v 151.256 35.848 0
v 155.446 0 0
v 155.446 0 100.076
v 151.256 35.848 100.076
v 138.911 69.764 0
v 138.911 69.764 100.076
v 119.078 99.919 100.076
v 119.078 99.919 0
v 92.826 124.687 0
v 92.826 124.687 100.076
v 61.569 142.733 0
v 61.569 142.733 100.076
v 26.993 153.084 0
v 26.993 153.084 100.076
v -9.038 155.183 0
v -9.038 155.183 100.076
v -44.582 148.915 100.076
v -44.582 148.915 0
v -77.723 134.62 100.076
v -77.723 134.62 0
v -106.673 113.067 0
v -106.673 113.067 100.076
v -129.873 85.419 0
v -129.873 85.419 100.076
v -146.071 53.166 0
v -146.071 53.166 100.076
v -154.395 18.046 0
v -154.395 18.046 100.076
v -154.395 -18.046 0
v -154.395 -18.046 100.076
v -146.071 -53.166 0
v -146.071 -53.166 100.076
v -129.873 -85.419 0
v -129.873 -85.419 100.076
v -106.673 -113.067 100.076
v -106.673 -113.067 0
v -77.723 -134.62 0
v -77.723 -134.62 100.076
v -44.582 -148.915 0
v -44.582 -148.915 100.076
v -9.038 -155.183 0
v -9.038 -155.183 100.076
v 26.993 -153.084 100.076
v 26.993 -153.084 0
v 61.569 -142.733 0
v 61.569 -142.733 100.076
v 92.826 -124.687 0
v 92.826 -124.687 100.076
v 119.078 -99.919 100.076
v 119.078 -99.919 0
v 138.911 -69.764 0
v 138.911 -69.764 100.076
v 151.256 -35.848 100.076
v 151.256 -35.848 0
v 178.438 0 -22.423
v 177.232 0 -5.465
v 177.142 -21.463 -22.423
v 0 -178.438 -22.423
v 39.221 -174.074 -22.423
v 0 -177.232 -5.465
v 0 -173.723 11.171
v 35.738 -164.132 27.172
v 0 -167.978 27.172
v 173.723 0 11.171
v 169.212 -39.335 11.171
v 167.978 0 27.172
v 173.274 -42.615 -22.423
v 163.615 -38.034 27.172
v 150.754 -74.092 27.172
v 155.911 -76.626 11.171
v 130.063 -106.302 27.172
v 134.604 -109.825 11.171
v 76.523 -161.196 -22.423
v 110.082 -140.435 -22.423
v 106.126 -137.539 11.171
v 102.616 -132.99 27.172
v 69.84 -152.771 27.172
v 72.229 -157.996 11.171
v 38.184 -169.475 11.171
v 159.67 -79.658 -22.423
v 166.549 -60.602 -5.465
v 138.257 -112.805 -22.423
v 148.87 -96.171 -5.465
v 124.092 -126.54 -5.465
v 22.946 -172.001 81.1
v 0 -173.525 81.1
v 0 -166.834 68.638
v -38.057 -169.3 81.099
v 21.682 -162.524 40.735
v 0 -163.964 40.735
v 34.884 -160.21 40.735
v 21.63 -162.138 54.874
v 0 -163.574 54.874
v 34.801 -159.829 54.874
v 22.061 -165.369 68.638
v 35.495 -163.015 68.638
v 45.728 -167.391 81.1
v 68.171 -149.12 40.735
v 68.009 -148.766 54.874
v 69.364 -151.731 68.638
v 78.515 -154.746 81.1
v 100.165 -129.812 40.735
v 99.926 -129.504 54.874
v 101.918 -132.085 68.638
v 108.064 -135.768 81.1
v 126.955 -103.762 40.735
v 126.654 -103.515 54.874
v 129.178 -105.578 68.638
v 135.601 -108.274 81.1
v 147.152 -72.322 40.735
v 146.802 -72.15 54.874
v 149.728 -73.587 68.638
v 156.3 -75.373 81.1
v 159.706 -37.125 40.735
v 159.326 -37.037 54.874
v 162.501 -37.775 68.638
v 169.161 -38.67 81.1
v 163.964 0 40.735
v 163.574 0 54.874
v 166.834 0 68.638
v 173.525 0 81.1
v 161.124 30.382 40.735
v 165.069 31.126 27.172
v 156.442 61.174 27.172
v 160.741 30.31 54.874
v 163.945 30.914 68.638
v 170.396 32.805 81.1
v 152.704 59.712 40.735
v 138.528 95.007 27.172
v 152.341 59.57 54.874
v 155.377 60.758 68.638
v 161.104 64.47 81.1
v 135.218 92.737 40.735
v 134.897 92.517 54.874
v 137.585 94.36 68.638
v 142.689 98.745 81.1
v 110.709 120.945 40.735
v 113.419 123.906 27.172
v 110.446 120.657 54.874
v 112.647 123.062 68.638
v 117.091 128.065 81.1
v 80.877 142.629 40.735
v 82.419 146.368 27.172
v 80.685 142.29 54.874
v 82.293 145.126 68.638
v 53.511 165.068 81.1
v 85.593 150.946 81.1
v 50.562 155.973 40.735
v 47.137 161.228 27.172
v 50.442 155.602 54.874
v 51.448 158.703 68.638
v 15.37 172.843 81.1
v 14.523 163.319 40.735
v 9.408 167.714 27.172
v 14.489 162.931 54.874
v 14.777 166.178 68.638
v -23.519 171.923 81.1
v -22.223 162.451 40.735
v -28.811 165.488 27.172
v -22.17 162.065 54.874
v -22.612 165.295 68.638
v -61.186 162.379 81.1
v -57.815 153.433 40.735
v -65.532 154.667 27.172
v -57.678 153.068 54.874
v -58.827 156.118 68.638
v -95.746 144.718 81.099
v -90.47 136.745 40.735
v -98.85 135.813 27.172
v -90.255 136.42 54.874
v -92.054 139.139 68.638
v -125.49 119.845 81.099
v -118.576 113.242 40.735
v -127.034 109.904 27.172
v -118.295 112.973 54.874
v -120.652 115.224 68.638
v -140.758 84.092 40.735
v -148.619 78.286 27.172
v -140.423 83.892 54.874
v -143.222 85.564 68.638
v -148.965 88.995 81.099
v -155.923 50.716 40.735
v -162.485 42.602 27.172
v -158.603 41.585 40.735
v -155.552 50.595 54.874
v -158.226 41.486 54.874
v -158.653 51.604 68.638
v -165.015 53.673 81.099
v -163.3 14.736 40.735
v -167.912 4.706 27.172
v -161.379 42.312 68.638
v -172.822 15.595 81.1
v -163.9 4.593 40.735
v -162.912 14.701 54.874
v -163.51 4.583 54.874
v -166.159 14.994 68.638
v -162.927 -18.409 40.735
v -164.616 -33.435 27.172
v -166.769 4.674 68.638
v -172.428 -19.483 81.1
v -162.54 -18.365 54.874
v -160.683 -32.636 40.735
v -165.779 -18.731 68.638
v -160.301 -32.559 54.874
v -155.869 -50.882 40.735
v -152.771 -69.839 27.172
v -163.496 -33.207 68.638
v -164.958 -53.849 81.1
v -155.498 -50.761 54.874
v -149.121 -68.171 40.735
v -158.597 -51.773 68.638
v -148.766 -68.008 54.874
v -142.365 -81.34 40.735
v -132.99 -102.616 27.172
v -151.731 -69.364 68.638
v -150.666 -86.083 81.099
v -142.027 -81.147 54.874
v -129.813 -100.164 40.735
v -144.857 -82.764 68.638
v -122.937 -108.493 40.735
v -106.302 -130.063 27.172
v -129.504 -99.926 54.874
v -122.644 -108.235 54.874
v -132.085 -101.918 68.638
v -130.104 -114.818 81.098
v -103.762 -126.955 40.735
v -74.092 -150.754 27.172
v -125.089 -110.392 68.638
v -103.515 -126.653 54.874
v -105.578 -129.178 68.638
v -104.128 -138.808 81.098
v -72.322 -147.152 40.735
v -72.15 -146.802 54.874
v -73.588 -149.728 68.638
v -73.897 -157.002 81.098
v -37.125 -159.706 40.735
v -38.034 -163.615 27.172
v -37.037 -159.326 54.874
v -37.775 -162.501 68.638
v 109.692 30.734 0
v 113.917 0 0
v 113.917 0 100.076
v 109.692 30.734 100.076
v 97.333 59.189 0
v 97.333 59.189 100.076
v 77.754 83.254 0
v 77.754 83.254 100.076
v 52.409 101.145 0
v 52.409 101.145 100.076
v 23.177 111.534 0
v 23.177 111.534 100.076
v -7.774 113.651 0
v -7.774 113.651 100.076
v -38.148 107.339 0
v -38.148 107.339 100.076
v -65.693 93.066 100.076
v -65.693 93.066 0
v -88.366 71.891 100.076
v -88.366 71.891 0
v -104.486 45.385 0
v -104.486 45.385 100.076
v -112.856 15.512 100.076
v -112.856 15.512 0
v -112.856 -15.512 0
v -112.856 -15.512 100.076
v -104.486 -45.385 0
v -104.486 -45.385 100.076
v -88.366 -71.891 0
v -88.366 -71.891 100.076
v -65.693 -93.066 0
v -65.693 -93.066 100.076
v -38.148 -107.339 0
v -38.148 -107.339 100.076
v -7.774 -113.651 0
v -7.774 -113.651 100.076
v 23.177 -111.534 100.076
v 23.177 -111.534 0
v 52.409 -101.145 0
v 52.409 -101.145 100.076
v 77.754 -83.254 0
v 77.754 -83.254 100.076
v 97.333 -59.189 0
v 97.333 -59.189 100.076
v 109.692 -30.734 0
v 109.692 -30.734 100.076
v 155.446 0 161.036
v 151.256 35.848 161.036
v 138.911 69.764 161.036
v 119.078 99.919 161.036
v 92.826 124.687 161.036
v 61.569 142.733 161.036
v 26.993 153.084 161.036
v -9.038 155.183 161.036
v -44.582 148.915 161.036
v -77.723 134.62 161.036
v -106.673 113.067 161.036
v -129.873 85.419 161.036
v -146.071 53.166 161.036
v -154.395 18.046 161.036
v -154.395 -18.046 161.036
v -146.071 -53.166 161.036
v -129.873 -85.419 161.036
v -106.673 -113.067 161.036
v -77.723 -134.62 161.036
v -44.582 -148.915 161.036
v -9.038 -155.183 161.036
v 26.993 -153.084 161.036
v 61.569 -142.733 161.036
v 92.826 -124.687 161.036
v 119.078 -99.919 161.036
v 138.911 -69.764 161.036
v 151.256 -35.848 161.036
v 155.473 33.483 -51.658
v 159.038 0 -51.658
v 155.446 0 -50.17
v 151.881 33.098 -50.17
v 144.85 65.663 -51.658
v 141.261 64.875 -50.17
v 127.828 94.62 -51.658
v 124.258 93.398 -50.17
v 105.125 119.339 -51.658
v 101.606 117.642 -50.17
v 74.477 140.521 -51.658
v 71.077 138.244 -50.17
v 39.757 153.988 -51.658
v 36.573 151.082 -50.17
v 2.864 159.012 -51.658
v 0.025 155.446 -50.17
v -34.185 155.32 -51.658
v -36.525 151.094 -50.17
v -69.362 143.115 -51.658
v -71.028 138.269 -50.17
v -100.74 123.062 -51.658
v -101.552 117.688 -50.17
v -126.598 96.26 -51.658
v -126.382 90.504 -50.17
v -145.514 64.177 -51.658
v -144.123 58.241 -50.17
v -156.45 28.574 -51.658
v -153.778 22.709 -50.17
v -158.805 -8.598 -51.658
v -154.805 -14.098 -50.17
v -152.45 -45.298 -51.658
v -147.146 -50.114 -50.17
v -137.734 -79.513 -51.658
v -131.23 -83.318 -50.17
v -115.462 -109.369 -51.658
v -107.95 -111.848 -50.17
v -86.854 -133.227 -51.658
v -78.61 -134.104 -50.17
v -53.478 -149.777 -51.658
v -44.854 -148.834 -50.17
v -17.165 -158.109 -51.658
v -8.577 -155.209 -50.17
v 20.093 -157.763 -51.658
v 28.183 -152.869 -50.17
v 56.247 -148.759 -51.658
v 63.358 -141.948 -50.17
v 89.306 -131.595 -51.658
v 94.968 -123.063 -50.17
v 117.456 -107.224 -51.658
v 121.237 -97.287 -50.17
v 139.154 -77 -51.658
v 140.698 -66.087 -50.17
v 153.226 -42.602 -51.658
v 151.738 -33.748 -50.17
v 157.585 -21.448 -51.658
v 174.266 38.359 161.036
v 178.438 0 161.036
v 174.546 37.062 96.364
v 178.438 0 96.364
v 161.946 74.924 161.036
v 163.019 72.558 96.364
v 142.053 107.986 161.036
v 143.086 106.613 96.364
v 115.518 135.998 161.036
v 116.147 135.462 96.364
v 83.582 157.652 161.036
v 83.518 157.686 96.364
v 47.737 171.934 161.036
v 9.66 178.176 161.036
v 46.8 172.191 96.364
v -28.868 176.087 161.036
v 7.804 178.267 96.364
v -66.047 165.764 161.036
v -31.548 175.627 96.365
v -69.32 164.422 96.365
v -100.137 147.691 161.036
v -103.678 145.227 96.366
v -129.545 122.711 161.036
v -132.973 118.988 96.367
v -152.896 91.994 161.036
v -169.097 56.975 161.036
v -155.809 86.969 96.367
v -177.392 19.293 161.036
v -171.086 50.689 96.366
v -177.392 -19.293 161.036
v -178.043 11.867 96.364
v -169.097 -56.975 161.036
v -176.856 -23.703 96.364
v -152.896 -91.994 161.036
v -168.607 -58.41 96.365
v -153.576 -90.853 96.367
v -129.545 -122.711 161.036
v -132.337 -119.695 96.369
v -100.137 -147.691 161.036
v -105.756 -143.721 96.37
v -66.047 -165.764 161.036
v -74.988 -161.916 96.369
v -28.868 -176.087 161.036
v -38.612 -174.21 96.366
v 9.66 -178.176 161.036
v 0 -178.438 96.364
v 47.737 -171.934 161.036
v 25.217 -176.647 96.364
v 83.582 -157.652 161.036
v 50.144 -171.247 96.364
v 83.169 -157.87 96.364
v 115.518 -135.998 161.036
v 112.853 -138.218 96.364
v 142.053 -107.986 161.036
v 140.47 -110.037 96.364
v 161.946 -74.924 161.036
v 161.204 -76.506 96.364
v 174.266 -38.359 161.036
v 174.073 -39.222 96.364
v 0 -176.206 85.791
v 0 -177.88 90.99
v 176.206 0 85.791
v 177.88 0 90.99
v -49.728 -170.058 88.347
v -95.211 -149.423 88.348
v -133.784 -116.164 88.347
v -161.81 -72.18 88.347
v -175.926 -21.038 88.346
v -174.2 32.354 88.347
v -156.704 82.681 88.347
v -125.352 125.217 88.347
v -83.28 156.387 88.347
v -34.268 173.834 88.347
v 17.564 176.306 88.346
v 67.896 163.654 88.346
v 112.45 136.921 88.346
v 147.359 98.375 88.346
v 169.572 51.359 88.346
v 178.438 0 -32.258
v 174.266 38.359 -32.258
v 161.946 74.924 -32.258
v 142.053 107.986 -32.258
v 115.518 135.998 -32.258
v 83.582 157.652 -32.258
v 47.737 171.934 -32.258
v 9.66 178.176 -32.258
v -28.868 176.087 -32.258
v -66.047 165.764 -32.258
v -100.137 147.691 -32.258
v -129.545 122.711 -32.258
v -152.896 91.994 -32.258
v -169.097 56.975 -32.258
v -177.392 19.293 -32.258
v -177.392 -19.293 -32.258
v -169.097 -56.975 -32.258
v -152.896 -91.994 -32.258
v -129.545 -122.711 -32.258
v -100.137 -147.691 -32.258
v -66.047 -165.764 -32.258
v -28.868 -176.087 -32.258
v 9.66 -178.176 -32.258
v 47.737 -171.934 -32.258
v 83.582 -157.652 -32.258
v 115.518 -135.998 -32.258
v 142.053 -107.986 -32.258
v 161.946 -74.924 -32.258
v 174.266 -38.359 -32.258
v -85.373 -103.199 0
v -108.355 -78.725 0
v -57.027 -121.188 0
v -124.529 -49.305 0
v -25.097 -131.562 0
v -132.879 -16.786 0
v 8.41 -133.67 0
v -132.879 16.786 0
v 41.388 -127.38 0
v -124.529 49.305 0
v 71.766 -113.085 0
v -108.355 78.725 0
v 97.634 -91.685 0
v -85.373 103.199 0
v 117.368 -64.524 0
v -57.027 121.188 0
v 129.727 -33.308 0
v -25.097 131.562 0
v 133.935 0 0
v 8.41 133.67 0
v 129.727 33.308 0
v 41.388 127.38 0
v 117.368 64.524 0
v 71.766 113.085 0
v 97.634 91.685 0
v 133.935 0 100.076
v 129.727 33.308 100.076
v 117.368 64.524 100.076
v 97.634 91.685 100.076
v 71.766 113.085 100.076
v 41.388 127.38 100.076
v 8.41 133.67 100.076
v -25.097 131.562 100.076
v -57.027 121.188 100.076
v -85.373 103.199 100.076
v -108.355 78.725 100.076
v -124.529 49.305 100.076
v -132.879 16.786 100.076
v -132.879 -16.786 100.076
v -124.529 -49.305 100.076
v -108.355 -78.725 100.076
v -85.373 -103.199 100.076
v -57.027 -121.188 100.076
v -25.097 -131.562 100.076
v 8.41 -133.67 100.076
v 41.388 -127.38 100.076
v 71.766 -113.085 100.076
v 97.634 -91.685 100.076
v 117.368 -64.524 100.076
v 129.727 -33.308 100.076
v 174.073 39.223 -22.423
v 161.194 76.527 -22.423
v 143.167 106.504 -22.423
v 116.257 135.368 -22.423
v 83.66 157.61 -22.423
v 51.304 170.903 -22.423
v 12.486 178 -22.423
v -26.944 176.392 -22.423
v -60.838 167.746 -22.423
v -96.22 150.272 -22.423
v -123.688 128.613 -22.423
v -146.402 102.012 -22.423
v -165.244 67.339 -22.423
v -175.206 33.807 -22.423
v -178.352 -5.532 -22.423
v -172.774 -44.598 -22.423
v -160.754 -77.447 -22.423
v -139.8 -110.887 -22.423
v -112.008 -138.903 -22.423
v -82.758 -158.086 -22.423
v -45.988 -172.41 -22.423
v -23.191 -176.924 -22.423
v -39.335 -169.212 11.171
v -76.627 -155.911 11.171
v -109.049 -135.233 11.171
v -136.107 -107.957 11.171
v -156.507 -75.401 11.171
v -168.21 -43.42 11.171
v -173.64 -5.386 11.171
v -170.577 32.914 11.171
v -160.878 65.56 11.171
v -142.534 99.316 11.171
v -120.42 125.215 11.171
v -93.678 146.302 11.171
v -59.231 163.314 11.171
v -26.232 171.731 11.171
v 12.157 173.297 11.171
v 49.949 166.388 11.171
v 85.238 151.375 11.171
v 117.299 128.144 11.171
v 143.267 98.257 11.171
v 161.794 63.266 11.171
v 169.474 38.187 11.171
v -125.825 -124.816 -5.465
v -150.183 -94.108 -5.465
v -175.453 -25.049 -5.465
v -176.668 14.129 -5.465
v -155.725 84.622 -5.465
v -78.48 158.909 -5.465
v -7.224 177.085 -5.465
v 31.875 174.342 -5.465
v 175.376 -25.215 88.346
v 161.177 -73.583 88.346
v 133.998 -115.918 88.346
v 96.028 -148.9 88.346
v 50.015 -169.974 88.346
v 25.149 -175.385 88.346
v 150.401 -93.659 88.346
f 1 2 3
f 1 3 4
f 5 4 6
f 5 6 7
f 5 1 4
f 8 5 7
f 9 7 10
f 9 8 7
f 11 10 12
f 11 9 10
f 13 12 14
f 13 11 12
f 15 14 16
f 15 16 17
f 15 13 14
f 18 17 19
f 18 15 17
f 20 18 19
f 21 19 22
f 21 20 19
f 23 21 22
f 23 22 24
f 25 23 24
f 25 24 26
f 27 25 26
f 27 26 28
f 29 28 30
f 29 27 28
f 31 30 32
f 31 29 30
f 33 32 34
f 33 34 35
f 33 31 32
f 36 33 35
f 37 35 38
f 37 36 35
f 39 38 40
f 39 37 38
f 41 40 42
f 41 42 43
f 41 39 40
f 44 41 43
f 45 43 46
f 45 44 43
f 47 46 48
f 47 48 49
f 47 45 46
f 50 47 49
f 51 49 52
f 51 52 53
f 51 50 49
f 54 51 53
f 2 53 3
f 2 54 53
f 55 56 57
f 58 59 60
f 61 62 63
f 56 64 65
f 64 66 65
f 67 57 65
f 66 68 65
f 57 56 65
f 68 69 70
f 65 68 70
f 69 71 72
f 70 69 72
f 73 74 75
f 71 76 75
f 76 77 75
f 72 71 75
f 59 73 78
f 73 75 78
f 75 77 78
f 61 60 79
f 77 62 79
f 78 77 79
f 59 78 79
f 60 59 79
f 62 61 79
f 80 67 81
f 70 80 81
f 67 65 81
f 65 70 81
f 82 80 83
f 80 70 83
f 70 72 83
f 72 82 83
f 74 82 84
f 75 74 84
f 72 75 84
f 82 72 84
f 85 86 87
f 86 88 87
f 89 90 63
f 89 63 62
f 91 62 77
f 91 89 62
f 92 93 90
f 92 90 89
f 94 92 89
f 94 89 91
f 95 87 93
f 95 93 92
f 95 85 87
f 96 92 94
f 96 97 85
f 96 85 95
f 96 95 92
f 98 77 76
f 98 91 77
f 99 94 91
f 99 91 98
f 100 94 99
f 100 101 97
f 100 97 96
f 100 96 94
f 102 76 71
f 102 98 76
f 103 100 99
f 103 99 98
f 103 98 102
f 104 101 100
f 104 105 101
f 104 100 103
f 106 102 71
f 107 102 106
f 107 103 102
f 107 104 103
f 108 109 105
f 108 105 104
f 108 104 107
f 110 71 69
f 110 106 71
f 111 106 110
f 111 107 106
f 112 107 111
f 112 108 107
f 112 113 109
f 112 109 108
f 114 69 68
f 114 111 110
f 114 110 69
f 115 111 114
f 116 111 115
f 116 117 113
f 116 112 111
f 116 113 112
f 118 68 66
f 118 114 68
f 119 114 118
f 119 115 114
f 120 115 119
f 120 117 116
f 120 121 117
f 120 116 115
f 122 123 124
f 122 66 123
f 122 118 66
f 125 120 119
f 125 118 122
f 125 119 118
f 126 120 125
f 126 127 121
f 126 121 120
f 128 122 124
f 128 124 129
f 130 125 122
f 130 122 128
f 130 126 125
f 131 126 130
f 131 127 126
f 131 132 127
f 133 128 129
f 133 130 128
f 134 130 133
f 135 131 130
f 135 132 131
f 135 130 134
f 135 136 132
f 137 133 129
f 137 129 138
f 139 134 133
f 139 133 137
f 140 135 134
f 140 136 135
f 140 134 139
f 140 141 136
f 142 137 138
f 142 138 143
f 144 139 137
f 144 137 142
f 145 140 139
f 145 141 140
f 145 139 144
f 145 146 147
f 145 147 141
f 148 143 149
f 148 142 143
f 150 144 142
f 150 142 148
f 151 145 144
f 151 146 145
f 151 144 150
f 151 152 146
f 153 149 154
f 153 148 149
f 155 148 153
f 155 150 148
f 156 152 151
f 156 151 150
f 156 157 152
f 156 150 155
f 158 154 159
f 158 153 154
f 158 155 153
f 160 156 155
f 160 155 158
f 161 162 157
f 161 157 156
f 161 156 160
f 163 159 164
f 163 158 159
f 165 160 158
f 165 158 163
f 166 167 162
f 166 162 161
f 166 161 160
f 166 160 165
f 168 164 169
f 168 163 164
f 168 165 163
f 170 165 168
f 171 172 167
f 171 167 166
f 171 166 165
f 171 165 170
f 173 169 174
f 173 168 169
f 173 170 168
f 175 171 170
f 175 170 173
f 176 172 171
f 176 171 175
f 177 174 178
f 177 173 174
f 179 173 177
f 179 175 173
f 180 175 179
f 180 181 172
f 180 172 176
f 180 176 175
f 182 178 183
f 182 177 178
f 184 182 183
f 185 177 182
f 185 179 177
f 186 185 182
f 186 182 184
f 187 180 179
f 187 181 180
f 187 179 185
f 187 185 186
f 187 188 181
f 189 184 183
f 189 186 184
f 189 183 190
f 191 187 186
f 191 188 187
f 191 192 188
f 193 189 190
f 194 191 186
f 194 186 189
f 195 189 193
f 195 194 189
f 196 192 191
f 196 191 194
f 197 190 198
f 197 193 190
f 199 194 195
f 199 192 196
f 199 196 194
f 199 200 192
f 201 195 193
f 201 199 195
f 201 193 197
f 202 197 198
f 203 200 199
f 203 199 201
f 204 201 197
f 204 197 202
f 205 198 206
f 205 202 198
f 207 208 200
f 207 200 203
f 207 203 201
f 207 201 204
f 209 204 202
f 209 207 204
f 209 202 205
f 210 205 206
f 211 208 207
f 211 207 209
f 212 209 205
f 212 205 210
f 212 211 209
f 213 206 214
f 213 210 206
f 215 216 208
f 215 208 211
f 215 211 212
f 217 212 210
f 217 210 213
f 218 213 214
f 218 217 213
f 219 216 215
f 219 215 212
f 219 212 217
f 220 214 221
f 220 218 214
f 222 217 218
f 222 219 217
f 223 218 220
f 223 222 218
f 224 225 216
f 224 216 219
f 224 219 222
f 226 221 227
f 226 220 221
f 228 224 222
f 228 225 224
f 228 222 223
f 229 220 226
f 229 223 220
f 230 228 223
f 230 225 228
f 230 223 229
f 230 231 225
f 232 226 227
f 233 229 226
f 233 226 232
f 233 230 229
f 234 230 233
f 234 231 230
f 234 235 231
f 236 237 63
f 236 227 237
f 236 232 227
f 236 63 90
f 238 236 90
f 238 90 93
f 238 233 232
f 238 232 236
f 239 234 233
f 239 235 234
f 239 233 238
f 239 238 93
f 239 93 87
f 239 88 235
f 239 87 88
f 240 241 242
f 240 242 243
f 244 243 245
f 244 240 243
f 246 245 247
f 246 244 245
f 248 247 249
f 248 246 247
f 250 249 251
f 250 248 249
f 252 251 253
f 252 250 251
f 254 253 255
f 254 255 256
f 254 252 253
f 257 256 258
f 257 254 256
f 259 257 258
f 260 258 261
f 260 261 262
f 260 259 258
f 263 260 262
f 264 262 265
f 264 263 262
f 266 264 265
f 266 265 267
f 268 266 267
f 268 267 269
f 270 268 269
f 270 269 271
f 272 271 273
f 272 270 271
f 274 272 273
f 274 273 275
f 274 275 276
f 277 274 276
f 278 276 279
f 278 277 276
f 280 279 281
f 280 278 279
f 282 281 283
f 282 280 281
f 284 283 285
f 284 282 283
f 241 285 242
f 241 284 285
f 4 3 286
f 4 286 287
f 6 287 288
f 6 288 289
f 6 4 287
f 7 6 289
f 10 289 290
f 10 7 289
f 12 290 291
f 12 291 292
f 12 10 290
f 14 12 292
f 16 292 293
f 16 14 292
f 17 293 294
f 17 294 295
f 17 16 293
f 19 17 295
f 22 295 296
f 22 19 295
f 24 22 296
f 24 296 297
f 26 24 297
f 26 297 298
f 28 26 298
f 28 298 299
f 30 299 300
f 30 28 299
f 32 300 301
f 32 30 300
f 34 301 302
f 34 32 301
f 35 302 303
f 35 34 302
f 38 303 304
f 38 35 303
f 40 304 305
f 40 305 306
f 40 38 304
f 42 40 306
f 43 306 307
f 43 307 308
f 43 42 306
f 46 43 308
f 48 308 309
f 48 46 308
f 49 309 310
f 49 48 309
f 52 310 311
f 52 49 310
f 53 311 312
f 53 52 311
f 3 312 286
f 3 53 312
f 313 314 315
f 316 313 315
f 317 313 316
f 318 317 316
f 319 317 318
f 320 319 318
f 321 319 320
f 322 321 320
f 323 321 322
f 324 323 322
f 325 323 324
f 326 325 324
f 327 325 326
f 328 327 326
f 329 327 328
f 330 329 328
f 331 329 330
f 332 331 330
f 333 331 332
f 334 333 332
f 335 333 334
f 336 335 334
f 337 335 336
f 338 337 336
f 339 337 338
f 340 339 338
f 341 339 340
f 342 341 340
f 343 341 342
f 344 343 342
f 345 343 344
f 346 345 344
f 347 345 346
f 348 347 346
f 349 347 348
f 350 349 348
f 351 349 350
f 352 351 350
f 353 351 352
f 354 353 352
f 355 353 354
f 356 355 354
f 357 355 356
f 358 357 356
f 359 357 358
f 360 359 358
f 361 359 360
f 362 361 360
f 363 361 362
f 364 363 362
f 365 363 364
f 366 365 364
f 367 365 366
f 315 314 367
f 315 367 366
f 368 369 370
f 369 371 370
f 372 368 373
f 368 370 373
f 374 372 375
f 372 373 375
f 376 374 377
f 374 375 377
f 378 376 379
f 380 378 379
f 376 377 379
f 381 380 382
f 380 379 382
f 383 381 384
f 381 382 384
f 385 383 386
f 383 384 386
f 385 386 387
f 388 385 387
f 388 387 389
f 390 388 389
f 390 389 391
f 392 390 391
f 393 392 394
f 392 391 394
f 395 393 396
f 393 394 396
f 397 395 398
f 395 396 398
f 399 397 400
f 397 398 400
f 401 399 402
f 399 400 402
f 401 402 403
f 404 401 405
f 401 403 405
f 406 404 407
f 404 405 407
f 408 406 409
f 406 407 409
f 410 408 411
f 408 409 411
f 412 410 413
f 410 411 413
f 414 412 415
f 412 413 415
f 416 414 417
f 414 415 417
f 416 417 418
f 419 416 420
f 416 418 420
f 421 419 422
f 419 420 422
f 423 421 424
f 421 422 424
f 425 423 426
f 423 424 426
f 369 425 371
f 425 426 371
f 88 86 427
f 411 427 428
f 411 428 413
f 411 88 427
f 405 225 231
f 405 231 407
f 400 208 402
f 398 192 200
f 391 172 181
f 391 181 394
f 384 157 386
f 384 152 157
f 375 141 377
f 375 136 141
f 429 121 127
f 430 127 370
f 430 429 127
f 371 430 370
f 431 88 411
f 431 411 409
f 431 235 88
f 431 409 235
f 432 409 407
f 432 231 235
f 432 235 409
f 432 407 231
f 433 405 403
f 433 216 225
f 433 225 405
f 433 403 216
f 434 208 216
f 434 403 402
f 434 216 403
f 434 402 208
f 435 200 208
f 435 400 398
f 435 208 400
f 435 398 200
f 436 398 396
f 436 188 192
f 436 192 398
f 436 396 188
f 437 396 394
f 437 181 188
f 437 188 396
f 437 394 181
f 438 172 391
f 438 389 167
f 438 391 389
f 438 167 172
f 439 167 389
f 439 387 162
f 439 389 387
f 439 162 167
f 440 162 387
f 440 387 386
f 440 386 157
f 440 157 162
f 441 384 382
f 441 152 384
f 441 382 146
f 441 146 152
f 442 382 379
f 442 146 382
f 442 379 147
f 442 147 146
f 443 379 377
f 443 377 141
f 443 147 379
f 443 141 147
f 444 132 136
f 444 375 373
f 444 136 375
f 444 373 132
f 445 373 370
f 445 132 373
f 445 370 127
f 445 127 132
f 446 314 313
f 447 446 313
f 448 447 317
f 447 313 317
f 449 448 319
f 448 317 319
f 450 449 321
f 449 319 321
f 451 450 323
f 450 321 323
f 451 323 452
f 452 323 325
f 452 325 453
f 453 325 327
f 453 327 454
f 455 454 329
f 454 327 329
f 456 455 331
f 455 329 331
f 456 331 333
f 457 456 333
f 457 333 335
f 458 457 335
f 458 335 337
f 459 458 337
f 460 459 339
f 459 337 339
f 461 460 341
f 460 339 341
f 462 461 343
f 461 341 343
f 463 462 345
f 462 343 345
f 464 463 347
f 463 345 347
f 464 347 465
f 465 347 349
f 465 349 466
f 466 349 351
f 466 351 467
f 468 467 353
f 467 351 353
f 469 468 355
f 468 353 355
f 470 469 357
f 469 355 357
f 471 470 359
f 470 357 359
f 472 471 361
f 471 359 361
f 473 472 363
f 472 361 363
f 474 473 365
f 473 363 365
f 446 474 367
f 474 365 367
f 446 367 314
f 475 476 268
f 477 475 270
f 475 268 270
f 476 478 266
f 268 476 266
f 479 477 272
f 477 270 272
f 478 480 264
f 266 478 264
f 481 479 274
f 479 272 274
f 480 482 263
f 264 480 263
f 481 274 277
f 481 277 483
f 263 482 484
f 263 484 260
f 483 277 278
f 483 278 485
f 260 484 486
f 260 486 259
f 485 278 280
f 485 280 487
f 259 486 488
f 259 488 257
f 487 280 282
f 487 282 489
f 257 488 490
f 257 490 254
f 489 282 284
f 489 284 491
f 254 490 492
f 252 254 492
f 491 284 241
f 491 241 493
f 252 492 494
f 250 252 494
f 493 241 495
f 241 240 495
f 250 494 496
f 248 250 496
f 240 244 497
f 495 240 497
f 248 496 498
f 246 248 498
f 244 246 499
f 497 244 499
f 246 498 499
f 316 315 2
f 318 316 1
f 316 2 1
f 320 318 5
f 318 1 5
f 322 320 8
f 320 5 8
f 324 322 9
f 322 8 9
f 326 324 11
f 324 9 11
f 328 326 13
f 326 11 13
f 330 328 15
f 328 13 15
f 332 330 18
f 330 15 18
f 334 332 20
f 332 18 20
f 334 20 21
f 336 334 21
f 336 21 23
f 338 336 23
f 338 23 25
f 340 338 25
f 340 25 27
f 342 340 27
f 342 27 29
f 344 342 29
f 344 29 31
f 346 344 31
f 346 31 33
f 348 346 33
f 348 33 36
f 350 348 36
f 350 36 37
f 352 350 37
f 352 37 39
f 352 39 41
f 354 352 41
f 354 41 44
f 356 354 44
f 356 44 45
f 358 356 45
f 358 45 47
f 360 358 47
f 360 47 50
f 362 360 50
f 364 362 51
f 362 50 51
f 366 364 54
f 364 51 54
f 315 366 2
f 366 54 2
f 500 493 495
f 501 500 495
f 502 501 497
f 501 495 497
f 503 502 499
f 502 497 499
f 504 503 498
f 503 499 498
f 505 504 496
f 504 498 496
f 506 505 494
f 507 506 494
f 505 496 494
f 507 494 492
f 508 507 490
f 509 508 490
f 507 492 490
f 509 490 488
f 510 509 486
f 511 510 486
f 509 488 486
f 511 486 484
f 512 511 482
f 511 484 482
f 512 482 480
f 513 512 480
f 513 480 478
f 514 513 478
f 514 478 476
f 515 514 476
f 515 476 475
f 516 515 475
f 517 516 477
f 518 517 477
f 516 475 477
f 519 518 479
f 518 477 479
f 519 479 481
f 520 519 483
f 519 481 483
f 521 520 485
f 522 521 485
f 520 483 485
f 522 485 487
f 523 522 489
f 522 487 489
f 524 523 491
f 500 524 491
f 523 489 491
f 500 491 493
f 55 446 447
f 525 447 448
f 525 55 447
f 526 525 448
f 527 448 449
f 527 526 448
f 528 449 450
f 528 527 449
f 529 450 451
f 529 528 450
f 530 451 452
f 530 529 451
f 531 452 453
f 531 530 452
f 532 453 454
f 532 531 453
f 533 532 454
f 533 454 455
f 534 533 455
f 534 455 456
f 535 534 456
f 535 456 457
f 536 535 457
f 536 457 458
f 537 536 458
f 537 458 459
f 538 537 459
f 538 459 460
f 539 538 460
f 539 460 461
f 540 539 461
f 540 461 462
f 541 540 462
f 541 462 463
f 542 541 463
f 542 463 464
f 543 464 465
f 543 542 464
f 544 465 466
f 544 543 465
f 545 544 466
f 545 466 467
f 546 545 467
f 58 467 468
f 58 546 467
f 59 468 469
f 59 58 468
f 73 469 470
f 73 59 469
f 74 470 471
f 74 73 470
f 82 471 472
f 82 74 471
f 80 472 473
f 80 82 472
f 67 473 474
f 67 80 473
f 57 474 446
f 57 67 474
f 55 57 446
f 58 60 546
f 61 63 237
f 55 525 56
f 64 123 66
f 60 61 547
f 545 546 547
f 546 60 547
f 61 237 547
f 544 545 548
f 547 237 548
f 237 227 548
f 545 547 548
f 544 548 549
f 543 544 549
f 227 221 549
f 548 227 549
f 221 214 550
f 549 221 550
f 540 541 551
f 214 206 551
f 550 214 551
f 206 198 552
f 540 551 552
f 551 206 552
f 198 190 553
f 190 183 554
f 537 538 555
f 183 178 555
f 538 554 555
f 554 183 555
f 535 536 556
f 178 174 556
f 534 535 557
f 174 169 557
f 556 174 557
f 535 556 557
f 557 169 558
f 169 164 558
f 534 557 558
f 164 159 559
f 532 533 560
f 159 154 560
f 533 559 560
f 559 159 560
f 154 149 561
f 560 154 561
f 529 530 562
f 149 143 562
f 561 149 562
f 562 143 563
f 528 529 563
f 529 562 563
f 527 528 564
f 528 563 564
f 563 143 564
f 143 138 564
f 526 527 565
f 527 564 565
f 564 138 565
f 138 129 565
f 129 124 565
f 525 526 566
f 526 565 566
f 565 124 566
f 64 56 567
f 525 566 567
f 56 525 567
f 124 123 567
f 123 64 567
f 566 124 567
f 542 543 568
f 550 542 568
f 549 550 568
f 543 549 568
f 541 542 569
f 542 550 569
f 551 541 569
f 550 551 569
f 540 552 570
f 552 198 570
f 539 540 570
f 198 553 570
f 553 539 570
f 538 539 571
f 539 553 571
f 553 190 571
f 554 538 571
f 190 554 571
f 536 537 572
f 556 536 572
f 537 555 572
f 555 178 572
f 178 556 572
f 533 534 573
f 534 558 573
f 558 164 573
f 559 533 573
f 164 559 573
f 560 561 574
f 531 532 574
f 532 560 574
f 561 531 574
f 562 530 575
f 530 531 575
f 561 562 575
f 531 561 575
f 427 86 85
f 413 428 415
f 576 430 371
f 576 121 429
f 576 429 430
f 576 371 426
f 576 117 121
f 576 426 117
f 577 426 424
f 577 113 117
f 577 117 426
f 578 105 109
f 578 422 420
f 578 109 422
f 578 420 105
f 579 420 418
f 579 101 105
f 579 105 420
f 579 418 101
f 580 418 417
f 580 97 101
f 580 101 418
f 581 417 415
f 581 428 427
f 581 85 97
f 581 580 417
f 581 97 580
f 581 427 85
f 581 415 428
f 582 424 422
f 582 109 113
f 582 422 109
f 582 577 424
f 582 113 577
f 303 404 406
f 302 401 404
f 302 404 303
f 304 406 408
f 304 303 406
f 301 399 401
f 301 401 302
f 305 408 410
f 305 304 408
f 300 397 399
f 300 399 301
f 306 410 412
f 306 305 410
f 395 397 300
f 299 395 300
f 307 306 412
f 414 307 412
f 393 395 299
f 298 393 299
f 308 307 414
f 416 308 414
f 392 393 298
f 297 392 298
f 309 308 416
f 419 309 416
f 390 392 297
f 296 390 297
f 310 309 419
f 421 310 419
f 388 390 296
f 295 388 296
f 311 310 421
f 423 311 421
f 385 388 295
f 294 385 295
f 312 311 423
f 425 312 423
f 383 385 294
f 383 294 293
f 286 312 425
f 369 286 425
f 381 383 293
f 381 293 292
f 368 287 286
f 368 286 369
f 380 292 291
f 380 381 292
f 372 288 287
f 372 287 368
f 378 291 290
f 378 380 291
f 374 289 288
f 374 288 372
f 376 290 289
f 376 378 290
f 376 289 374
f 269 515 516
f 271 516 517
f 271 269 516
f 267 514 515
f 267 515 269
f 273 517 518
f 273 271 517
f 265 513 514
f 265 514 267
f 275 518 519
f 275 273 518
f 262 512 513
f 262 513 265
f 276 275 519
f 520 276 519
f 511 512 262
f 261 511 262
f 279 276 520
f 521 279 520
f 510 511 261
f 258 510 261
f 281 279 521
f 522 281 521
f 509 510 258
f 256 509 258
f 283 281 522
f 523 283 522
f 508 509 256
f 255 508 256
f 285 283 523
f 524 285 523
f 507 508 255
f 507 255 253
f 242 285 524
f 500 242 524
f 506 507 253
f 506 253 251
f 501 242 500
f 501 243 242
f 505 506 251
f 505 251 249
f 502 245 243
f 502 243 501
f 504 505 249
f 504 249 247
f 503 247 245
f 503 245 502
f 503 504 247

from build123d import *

# Parameters (mm, degrees)
F0_R        = 178.4376232985
F0_R_2      = 155.4455933773
F1_DEPTH    = 100.076
F0_R_3      = 133.9347560768
F0_R_4      = 113.9166344001
F4_DEPTH    = 57.658
F6_T2_ANGLE = 270
F6_T4_ANGLE = 90
F7_R        = 26.1680448885
F8_DEPTH    = 60.96
F9_SIZE     = 5.08


# Not quite as in the source:
# - a fillet or chamfer that OpenCascade refuses, or shapes differently, is made with other operations: its cross-section is extruded or revolved along the edge and cut away or added


with BuildPart() as f1:
    # F0 (on Top) → F1 (new body)
    with BuildSketch(Plane.XY):
        Circle(F0_R)
        Circle(F0_R_2, mode=Mode.SUBTRACT)
    extrude(amount=F1_DEPTH)

    # F2 (on Right) → F3 (revolve, cut)
    with BuildSketch(Plane.YZ):
        with BuildLine():
            Line((-211.7950618267, 10.4418387637), (-179.0756136179, 10.9223620966))
            ThreePointArc((-179.0756136179, 10.9223620966), (-163.2878596781, 49.2948652245), (-179.0756136179, 87.6673683524))
            Line((-179.0756136179, 87.6673683524), (-211.7950618267, 87.6673683524))
            Line((-211.7950618267, 87.6673683524), (-211.7950618267, 10.4418387637))
        make_face()
    revolve(axis=Axis((0, 0, 100.076), (0, 0, 1)), mode=Mode.SUBTRACT)

    # F4 (add): a face of the model
    f4_faces = [f1.faces().sort_by_distance(p)[0] for p in [
        (-173.3906451604, 0, 0),
    ]]
    extrude(f4_faces, amount=F4_DEPTH)

    # F5: chamfer of 25.4 on 1 edges, made by hand

    # F5_s1 → F5_t2 (revolve, cut)
    with BuildSketch(Plane.XZ):
        Polygon((178.4376232985, -32.258), (153.0376232985, -57.658), (178.4376232985, -57.658), align=None)
    revolve(axis=Axis((0, 0, -57.658), (0, 0, 1)), mode=Mode.SUBTRACT)

    # F6: fillet of radius 124.2982132205 on 5 edges, made by hand

    # F6_s1 → F6_t2 (revolve, cut)
    with BuildSketch(Plane.YZ):
        with BuildLine():
            ThreePointArc((-178.4380232985, -22.7388058016), (-175.7769269935, 2.8438127421), (-167.9075785228, 27.3310575799))
            Line((-167.9075785228, 27.3310575799), (-179.2845953673, 32.338043918))
            ThreePointArc((-179.2845953673, 32.338043918), (-182.8167956296, 25.9008324787), (-187.4140893132, 20.1755608169))
            Line((-187.4140893132, 20.1755608169), (-190.8676846206, 11.5773352816))
            ThreePointArc((-190.8676846206, 11.5773352816), (-190.8676846206, -5.58073526), (-190.8680846206, -22.7388058016))
            Line((-190.8680846206, -22.7388058016), (-178.4380232985, -22.7388058016))
        make_face()
    revolve(axis=Axis((0, 0, 11.5773352816), (0, 0, -1)), revolution_arc=F6_T2_ANGLE, mode=Mode.SUBTRACT)

    # F6_s3 → F6_t4 (revolve, cut)
    with BuildSketch(Plane.XZ):
        with BuildLine():
            ThreePointArc((178.4380232985, -22.7388058016), (175.7769269935, 2.8438127421), (167.9075785228, 27.3310575799))
            Line((167.9075785228, 27.3310575799), (179.2845953673, 32.338043918))
            ThreePointArc((179.2845953673, 32.338043918), (182.8167956296, 25.9008324787), (187.4140893132, 20.1755608169))
            Line((187.4140893132, 20.1755608169), (190.8676846206, 11.5773352816))
            ThreePointArc((190.8676846206, 11.5773352816), (190.8676846206, -5.58073526), (190.8680846206, -22.7388058016))
            Line((190.8680846206, -22.7388058016), (178.4380232985, -22.7388058016))
        make_face()
    revolve(axis=Axis((0, 0, 11.5773352816), (0, 0, -1)), revolution_arc=F6_T4_ANGLE, mode=Mode.SUBTRACT)

    # F7
    f7_edges = [f1.edges().sort_by_distance(p)[0] for p in [
        (-118.778106, 118.778106, 27.171632),
        (118.778106, -118.778106, 27.171632),
        (0, -164.10225, 58.683609),
        (126.174453, -126.174453, 87.012395),
        (-126.174453, 126.174453, 87.012395),
    ]]
    fillet(f7_edges, radius=F7_R)

    # F8 (add): a face of the model
    f8_faces = [f1.faces().sort_by_distance(p)[0] for p in [
        (-173.3906451604, 0, 100.076),
    ]]
    extrude(f8_faces, amount=F8_DEPTH)

    # F9
    f9_edges = [f1.edges().sort_by_distance(p)[0] for p in [
        (-155.445593, 0, -55.25003),
    ]]
    chamfer(f9_edges, length=F9_SIZE)


with BuildPart() as f1b:
    # F0 (on Top) → F1, piece 2 (new body)
    with BuildSketch(Plane.XY):
        Circle(F0_R_3)
        Circle(F0_R_4, mode=Mode.SUBTRACT)
    extrude(amount=F1_DEPTH)


solid = Compound([f1.part, f1b.part])
